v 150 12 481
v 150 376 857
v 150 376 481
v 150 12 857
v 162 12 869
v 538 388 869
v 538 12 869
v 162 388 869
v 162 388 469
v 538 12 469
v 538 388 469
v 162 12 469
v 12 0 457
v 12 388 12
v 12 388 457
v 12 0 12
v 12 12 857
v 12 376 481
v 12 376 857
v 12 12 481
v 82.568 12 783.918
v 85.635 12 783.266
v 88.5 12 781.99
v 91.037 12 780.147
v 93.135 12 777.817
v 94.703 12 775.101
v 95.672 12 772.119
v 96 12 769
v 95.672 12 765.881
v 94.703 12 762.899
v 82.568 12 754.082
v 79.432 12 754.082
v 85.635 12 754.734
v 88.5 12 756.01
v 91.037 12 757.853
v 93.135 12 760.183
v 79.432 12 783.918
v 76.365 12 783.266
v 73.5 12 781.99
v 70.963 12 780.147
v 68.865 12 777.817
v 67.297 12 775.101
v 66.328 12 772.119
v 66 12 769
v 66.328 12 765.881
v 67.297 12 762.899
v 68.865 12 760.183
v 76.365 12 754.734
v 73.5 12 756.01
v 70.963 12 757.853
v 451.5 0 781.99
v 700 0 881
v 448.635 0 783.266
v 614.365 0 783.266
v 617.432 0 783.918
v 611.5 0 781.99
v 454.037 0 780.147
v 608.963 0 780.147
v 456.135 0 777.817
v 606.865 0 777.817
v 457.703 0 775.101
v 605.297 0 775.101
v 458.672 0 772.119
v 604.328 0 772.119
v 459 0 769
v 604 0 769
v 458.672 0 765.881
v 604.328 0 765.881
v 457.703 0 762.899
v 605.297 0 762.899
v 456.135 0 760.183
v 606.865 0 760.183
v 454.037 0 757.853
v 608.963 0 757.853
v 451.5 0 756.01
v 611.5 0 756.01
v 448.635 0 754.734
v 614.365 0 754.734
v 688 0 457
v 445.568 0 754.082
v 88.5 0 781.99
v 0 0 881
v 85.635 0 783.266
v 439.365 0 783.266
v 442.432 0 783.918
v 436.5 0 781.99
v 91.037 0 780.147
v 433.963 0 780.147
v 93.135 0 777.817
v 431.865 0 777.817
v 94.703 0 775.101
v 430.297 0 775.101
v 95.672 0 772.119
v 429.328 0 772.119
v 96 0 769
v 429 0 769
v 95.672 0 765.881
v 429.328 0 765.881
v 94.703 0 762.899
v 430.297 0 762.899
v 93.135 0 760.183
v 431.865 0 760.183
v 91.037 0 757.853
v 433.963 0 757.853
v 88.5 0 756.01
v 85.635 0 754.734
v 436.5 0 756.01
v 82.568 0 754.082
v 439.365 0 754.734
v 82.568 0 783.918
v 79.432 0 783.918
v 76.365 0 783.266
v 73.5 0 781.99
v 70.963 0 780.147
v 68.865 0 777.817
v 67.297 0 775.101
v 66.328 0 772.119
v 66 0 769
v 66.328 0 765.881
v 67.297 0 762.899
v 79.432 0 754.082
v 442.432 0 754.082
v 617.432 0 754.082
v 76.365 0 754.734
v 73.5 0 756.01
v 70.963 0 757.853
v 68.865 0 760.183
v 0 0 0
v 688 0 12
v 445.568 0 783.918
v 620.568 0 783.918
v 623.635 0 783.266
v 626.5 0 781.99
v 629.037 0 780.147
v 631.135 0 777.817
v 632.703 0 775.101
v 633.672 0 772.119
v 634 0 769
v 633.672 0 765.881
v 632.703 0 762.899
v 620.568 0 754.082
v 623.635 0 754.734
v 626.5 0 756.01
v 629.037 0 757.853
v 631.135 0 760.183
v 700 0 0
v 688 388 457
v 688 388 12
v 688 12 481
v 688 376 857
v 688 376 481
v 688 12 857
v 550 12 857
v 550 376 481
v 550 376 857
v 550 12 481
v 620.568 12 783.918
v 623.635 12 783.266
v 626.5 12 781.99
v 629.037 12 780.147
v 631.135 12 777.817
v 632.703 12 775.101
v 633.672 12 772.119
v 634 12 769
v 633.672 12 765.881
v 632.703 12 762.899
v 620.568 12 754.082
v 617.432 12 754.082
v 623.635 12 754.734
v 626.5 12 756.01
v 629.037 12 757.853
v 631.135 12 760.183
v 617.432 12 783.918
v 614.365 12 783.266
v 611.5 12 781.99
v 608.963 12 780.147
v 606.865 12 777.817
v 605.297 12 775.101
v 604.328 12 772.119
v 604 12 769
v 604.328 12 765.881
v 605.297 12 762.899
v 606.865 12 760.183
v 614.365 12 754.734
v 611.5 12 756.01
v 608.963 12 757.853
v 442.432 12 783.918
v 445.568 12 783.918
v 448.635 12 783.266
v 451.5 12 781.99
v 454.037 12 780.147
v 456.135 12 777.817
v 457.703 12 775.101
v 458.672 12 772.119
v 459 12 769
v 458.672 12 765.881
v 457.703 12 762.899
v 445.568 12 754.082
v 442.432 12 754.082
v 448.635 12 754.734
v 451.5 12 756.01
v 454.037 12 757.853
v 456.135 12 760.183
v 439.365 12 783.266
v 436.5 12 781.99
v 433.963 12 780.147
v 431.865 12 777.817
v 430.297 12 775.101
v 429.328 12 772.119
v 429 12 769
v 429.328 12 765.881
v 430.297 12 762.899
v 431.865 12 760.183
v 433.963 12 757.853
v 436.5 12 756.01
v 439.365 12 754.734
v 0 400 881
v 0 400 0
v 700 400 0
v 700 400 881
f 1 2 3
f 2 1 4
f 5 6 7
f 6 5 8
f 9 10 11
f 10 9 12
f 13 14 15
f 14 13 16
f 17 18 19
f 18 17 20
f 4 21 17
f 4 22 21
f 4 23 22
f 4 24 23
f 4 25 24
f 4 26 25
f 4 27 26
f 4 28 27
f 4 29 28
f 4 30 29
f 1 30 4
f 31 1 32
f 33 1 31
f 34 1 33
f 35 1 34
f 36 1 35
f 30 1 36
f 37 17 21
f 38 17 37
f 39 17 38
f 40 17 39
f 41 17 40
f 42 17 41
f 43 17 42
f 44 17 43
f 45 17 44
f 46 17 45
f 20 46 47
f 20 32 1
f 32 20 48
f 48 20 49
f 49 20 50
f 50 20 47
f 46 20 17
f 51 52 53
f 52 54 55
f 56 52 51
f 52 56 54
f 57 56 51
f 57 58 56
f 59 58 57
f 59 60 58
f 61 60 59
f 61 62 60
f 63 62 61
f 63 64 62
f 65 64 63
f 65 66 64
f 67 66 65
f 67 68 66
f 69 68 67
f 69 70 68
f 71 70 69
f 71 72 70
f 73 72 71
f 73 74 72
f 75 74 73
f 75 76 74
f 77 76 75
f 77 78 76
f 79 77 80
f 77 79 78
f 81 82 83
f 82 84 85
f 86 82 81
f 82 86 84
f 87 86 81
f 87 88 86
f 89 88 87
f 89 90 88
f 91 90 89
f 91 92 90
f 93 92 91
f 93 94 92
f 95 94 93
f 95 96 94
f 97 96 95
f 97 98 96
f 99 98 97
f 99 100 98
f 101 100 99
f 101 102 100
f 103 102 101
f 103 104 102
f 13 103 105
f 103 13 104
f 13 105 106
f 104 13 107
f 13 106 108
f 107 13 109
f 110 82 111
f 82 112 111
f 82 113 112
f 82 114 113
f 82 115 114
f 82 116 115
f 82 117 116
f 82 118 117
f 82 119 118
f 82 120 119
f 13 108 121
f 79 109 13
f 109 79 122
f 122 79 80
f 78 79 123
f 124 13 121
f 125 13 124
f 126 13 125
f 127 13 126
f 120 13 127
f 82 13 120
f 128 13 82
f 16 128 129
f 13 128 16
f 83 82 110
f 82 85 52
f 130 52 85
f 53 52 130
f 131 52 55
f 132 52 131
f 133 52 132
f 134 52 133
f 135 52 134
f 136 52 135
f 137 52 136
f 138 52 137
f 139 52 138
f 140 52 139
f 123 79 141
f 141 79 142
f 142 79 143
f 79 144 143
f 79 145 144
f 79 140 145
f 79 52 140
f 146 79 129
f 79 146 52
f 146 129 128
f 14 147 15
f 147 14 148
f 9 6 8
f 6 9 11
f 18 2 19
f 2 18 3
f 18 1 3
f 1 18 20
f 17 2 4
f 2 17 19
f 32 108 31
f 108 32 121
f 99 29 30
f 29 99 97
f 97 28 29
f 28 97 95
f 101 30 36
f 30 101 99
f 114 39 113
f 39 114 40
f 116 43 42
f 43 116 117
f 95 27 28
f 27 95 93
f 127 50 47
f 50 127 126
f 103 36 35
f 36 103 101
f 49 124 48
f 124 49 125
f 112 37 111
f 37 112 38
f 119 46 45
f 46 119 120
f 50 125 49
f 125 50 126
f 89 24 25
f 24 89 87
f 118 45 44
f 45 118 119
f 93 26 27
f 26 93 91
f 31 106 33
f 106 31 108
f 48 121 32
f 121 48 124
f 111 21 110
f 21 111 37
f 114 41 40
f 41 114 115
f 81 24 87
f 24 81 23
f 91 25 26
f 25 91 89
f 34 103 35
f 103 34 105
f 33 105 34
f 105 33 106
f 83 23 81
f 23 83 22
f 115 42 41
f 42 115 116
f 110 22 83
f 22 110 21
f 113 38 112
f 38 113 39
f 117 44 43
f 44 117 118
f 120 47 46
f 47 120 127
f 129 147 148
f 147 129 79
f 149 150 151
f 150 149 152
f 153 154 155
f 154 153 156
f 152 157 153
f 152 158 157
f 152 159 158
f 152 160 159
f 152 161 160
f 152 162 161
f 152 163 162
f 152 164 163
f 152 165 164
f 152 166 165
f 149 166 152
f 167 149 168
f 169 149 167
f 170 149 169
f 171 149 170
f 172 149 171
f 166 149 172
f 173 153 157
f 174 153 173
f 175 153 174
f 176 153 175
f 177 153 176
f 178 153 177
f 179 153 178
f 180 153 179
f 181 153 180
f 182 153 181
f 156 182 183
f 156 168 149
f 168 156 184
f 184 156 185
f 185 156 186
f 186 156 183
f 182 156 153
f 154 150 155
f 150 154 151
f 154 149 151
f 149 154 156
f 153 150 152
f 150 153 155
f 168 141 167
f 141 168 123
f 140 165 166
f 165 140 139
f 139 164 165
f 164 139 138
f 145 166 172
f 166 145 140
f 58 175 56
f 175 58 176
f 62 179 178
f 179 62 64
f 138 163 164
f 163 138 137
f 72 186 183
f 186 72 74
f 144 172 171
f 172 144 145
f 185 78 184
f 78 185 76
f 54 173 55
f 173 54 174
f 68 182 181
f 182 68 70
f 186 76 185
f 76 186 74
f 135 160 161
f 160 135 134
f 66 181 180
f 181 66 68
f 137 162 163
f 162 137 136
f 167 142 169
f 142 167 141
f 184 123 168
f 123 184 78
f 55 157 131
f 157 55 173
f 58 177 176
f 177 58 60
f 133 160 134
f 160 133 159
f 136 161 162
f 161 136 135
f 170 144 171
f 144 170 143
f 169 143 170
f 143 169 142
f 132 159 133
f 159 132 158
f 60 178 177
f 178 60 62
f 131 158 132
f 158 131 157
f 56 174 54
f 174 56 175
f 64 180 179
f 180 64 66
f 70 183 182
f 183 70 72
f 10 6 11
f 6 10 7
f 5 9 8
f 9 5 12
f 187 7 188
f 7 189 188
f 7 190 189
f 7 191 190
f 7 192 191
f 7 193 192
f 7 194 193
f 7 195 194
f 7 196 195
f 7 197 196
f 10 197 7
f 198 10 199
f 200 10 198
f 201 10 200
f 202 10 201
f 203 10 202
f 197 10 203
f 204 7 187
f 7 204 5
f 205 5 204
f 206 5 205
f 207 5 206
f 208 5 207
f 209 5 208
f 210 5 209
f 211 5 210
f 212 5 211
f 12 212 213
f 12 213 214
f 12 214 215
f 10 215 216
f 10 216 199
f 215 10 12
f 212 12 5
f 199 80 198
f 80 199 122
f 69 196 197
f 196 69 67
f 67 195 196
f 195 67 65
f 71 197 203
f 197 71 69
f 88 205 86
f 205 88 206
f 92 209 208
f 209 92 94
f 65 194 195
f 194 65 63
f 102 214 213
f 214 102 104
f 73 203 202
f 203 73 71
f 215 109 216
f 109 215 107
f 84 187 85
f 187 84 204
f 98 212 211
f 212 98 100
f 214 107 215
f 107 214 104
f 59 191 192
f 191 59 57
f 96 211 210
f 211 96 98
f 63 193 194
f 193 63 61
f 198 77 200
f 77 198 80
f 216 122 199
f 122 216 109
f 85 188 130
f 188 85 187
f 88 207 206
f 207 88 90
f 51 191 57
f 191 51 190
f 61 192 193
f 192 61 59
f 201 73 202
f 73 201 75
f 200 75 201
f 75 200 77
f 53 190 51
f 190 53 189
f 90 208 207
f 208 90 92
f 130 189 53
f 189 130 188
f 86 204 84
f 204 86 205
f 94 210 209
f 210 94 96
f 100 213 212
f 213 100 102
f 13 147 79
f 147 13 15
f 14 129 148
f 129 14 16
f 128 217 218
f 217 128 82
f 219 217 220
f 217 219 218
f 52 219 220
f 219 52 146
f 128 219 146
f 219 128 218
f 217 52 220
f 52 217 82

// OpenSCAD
// file: door.scad
/*
    Door
    
    By Anton Augustsson
*/

module door (
    thicknessPlywood,
    height,
    width,
    x,y,z
    ){
/*
    ---------- Local varibles ---------- 
*/

holeDiameter = 30;


/*
    ---------- Code ---------- 
*/
  
translate([
    x,
    y,
    z])
difference () {
union () {

// Front
translate([
    0,
    0,
    0])
cube([
    width,
    thicknessPlywood,
    height]);

}
translate([
    width/4*3,
    -1,
    height/4*3])
rotate([-90,0,0])
cylinder(
    h = thicknessPlywood+2,
    r = holeDiameter/2
    );

}
}


/*
    ---------- Example ---------- 
*/

sideOverhangWidth = 100;
sideOverhangDepth = 50;

thicknessMdf = 19;
thicknessPlywood = 12; 

totalHeight = 900;
totalWidth = 900; // t-profile
totalDepth = 500;

foundationHeight = 
    totalHeight
    -thicknessMdf;
foundationWidth = 
    totalWidth
    -sideOverhangWidth*2;
foundationDepth =
    totalDepth
    -sideOverhangDepth*2;

routerBoxHeight = 400;
routerBoxWidth = 400;        
positionShelfHeight = 
        foundationHeight
        -thicknessPlywood*2
        -routerBoxHeight;

sideHeight = 
        foundationHeight
        -thicknessPlywood*2;


door (
    thicknessPlywood,
    routerBoxHeight,
    routerBoxWidth,
    0,0,0
    );
// file: router-drawer.scad
/*
    Router-drawer
    
    By Anton Augustsson
*/

module routerDrawer (
    thicknessPlywood,
    height,
    width,
    depth,
    x,y,z
    ){
/*
    ---------- Local varibles ---------- 
*/

holeDiameter = 30;


/*
    ---------- Code ---------- 
*/
  
translate([
    x,
    y,
    z])
difference () {
union () {

// Front
translate([
    0,
    0,
    0])
cube([
    width,
    thicknessPlywood,
    height]);

// Back
translate([
    0,
    depth-thicknessPlywood,
    0])
cube([
    width,
    thicknessPlywood,
    height]);

// Bottom
translate([
    0,
    thicknessPlywood,
    0])
cube([
    width,
    depth-thicknessPlywood*2,
    thicknessPlywood]);

// Top
translate([
    0,
    thicknessPlywood,
    height-thicknessPlywood])
cube([
    width,
    depth-thicknessPlywood*2,
    thicknessPlywood]);
}
translate([
    width/2,
    -1,
    height/4*3])
rotate([-90,0,0])
cylinder(
    h = thicknessPlywood+2,
    r = holeDiameter/2
    );

}
}


/*
    ---------- Example ---------- 
*/

sideOverhangWidth = 100;
sideOverhangDepth = 50;

thicknessMdf = 19;
thicknessPlywood = 12; 

totalHeight = 900;
totalWidth = 900; // t-profile
totalDepth = 500;

foundationHeight = 
    totalHeight
    -thicknessMdf;
foundationWidth = 
    totalWidth
    -sideOverhangWidth*2;
foundationDepth =
    totalDepth
    -sideOverhangDepth*2;

routerBoxHeight = 400;
routerBoxWidth = 400;        
positionShelfHeight = 
        foundationHeight
        -thicknessPlywood*2
        -routerBoxHeight;

sideHeight = 
        foundationHeight
        -thicknessPlywood*2;


routerDrawer (
    thicknessPlywood,
    routerBoxHeight,
    (routerBoxWidth-thicknessPlywood*2)/2,
    foundationDepth-thicknessPlywood,
    0,0,0
    );
// main file
/*
    Foundation
    
    By Anton Augustsson
*/

use <router-drawer.scad>;
use <door.scad>;

module foundation (
    thicknessPlywood,
    foundationHeight,
    foundationWidth,
    foundationDepth,
    x,y,z
    ){
/*
    ---------- Local varibles ---------- 
*/

routerBoxHeight = 400;
routerBoxWidth = 400;        
positionShelfHeight = 
        foundationHeight
        -thicknessPlywood*2
        -routerBoxHeight;

sideHeight = 
        foundationHeight
        -thicknessPlywood*2;

boxWidth = (foundationWidth
        -routerBoxWidth
        -thicknessPlywood*2)/2;
boxDepth = foundationDepth-
        thicknessPlywood;
        
/*
    ---------- Code ---------- 
*/
  
translate([
    x,
    y,
    z])
union () {

// Side Left
translate([
    0,
    0,
    thicknessPlywood])
cube([
    thicknessPlywood,
    foundationDepth,
    sideHeight]);

// Side Right
translate([
    foundationWidth
    -thicknessPlywood,
    0,
    thicknessPlywood])
cube([
    thicknessPlywood,
    foundationDepth,
    sideHeight]);

// bottom
translate([
    0,
    0,
    0])
cube([
    foundationWidth,
    foundationDepth,
    thicknessPlywood]);

// top
translate([
    0,
    0,
    foundationHeight-thicknessPlywood])
cube([
    foundationWidth,
    foundationDepth,
    thicknessPlywood]);

// Back
translate([
    0,
    foundationDepth-thicknessPlywood,
    thicknessPlywood])
cube([
    foundationWidth,
    thicknessPlywood,
    sideHeight]);

union () {
// Shelf
translate([
    thicknessPlywood,
    0,
    positionShelfHeight])
cube([
    foundationWidth-thicknessPlywood*2,
    foundationDepth-thicknessPlywood,
    thicknessPlywood]);

// Box side left
translate([
    foundationWidth/2-routerBoxWidth/2,
    0,
    positionShelfHeight
    +thicknessPlywood])
cube([
    thicknessPlywood,
    foundationDepth-thicknessPlywood,
    routerBoxHeight]);

// Box side right
translate([
    foundationWidth/2+routerBoxWidth/2
    -thicknessPlywood,
    0,
    positionShelfHeight
    +thicknessPlywood])
cube([
    thicknessPlywood,
    foundationDepth-thicknessPlywood,
    routerBoxHeight]);

// Drawer box left
routerDrawer (
    thicknessPlywood,
    routerBoxHeight,
    boxWidth,
    boxDepth,
    thicknessPlywood,0,
    positionShelfHeight
    +thicknessPlywood
    );

// Drawer box right
routerDrawer (
    thicknessPlywood,
    routerBoxHeight,
    boxWidth,
    boxDepth,
    foundationWidth
    -boxWidth-thicknessPlywood,0,
    positionShelfHeight
    +thicknessPlywood
    );
    
// Router door
door (
    thicknessPlywood,
    routerBoxHeight,
    routerBoxWidth-thicknessPlywood*2,
    boxWidth+thicknessPlywood*2,0,
    positionShelfHeight
    +thicknessPlywood
    );
}
}
}


/*
    ---------- Example ---------- 
*/

sideOverhangWidth = 100;
sideOverhangDepth = 50;

thicknessMdf = 19;
thicknessPlywood = 12; 

totalHeight = 900;
totalWidth = 900; // t-profile
totalDepth = 500;

foundationHeight = 
    totalHeight
    -thicknessMdf;
foundationWidth = 
    totalWidth
    -sideOverhangWidth*2;
foundationDepth =
    totalDepth
    -sideOverhangDepth*2;


foundation (
    thicknessPlywood,
    foundationHeight,
    foundationWidth,
    foundationDepth,
    0,0,0
    );
